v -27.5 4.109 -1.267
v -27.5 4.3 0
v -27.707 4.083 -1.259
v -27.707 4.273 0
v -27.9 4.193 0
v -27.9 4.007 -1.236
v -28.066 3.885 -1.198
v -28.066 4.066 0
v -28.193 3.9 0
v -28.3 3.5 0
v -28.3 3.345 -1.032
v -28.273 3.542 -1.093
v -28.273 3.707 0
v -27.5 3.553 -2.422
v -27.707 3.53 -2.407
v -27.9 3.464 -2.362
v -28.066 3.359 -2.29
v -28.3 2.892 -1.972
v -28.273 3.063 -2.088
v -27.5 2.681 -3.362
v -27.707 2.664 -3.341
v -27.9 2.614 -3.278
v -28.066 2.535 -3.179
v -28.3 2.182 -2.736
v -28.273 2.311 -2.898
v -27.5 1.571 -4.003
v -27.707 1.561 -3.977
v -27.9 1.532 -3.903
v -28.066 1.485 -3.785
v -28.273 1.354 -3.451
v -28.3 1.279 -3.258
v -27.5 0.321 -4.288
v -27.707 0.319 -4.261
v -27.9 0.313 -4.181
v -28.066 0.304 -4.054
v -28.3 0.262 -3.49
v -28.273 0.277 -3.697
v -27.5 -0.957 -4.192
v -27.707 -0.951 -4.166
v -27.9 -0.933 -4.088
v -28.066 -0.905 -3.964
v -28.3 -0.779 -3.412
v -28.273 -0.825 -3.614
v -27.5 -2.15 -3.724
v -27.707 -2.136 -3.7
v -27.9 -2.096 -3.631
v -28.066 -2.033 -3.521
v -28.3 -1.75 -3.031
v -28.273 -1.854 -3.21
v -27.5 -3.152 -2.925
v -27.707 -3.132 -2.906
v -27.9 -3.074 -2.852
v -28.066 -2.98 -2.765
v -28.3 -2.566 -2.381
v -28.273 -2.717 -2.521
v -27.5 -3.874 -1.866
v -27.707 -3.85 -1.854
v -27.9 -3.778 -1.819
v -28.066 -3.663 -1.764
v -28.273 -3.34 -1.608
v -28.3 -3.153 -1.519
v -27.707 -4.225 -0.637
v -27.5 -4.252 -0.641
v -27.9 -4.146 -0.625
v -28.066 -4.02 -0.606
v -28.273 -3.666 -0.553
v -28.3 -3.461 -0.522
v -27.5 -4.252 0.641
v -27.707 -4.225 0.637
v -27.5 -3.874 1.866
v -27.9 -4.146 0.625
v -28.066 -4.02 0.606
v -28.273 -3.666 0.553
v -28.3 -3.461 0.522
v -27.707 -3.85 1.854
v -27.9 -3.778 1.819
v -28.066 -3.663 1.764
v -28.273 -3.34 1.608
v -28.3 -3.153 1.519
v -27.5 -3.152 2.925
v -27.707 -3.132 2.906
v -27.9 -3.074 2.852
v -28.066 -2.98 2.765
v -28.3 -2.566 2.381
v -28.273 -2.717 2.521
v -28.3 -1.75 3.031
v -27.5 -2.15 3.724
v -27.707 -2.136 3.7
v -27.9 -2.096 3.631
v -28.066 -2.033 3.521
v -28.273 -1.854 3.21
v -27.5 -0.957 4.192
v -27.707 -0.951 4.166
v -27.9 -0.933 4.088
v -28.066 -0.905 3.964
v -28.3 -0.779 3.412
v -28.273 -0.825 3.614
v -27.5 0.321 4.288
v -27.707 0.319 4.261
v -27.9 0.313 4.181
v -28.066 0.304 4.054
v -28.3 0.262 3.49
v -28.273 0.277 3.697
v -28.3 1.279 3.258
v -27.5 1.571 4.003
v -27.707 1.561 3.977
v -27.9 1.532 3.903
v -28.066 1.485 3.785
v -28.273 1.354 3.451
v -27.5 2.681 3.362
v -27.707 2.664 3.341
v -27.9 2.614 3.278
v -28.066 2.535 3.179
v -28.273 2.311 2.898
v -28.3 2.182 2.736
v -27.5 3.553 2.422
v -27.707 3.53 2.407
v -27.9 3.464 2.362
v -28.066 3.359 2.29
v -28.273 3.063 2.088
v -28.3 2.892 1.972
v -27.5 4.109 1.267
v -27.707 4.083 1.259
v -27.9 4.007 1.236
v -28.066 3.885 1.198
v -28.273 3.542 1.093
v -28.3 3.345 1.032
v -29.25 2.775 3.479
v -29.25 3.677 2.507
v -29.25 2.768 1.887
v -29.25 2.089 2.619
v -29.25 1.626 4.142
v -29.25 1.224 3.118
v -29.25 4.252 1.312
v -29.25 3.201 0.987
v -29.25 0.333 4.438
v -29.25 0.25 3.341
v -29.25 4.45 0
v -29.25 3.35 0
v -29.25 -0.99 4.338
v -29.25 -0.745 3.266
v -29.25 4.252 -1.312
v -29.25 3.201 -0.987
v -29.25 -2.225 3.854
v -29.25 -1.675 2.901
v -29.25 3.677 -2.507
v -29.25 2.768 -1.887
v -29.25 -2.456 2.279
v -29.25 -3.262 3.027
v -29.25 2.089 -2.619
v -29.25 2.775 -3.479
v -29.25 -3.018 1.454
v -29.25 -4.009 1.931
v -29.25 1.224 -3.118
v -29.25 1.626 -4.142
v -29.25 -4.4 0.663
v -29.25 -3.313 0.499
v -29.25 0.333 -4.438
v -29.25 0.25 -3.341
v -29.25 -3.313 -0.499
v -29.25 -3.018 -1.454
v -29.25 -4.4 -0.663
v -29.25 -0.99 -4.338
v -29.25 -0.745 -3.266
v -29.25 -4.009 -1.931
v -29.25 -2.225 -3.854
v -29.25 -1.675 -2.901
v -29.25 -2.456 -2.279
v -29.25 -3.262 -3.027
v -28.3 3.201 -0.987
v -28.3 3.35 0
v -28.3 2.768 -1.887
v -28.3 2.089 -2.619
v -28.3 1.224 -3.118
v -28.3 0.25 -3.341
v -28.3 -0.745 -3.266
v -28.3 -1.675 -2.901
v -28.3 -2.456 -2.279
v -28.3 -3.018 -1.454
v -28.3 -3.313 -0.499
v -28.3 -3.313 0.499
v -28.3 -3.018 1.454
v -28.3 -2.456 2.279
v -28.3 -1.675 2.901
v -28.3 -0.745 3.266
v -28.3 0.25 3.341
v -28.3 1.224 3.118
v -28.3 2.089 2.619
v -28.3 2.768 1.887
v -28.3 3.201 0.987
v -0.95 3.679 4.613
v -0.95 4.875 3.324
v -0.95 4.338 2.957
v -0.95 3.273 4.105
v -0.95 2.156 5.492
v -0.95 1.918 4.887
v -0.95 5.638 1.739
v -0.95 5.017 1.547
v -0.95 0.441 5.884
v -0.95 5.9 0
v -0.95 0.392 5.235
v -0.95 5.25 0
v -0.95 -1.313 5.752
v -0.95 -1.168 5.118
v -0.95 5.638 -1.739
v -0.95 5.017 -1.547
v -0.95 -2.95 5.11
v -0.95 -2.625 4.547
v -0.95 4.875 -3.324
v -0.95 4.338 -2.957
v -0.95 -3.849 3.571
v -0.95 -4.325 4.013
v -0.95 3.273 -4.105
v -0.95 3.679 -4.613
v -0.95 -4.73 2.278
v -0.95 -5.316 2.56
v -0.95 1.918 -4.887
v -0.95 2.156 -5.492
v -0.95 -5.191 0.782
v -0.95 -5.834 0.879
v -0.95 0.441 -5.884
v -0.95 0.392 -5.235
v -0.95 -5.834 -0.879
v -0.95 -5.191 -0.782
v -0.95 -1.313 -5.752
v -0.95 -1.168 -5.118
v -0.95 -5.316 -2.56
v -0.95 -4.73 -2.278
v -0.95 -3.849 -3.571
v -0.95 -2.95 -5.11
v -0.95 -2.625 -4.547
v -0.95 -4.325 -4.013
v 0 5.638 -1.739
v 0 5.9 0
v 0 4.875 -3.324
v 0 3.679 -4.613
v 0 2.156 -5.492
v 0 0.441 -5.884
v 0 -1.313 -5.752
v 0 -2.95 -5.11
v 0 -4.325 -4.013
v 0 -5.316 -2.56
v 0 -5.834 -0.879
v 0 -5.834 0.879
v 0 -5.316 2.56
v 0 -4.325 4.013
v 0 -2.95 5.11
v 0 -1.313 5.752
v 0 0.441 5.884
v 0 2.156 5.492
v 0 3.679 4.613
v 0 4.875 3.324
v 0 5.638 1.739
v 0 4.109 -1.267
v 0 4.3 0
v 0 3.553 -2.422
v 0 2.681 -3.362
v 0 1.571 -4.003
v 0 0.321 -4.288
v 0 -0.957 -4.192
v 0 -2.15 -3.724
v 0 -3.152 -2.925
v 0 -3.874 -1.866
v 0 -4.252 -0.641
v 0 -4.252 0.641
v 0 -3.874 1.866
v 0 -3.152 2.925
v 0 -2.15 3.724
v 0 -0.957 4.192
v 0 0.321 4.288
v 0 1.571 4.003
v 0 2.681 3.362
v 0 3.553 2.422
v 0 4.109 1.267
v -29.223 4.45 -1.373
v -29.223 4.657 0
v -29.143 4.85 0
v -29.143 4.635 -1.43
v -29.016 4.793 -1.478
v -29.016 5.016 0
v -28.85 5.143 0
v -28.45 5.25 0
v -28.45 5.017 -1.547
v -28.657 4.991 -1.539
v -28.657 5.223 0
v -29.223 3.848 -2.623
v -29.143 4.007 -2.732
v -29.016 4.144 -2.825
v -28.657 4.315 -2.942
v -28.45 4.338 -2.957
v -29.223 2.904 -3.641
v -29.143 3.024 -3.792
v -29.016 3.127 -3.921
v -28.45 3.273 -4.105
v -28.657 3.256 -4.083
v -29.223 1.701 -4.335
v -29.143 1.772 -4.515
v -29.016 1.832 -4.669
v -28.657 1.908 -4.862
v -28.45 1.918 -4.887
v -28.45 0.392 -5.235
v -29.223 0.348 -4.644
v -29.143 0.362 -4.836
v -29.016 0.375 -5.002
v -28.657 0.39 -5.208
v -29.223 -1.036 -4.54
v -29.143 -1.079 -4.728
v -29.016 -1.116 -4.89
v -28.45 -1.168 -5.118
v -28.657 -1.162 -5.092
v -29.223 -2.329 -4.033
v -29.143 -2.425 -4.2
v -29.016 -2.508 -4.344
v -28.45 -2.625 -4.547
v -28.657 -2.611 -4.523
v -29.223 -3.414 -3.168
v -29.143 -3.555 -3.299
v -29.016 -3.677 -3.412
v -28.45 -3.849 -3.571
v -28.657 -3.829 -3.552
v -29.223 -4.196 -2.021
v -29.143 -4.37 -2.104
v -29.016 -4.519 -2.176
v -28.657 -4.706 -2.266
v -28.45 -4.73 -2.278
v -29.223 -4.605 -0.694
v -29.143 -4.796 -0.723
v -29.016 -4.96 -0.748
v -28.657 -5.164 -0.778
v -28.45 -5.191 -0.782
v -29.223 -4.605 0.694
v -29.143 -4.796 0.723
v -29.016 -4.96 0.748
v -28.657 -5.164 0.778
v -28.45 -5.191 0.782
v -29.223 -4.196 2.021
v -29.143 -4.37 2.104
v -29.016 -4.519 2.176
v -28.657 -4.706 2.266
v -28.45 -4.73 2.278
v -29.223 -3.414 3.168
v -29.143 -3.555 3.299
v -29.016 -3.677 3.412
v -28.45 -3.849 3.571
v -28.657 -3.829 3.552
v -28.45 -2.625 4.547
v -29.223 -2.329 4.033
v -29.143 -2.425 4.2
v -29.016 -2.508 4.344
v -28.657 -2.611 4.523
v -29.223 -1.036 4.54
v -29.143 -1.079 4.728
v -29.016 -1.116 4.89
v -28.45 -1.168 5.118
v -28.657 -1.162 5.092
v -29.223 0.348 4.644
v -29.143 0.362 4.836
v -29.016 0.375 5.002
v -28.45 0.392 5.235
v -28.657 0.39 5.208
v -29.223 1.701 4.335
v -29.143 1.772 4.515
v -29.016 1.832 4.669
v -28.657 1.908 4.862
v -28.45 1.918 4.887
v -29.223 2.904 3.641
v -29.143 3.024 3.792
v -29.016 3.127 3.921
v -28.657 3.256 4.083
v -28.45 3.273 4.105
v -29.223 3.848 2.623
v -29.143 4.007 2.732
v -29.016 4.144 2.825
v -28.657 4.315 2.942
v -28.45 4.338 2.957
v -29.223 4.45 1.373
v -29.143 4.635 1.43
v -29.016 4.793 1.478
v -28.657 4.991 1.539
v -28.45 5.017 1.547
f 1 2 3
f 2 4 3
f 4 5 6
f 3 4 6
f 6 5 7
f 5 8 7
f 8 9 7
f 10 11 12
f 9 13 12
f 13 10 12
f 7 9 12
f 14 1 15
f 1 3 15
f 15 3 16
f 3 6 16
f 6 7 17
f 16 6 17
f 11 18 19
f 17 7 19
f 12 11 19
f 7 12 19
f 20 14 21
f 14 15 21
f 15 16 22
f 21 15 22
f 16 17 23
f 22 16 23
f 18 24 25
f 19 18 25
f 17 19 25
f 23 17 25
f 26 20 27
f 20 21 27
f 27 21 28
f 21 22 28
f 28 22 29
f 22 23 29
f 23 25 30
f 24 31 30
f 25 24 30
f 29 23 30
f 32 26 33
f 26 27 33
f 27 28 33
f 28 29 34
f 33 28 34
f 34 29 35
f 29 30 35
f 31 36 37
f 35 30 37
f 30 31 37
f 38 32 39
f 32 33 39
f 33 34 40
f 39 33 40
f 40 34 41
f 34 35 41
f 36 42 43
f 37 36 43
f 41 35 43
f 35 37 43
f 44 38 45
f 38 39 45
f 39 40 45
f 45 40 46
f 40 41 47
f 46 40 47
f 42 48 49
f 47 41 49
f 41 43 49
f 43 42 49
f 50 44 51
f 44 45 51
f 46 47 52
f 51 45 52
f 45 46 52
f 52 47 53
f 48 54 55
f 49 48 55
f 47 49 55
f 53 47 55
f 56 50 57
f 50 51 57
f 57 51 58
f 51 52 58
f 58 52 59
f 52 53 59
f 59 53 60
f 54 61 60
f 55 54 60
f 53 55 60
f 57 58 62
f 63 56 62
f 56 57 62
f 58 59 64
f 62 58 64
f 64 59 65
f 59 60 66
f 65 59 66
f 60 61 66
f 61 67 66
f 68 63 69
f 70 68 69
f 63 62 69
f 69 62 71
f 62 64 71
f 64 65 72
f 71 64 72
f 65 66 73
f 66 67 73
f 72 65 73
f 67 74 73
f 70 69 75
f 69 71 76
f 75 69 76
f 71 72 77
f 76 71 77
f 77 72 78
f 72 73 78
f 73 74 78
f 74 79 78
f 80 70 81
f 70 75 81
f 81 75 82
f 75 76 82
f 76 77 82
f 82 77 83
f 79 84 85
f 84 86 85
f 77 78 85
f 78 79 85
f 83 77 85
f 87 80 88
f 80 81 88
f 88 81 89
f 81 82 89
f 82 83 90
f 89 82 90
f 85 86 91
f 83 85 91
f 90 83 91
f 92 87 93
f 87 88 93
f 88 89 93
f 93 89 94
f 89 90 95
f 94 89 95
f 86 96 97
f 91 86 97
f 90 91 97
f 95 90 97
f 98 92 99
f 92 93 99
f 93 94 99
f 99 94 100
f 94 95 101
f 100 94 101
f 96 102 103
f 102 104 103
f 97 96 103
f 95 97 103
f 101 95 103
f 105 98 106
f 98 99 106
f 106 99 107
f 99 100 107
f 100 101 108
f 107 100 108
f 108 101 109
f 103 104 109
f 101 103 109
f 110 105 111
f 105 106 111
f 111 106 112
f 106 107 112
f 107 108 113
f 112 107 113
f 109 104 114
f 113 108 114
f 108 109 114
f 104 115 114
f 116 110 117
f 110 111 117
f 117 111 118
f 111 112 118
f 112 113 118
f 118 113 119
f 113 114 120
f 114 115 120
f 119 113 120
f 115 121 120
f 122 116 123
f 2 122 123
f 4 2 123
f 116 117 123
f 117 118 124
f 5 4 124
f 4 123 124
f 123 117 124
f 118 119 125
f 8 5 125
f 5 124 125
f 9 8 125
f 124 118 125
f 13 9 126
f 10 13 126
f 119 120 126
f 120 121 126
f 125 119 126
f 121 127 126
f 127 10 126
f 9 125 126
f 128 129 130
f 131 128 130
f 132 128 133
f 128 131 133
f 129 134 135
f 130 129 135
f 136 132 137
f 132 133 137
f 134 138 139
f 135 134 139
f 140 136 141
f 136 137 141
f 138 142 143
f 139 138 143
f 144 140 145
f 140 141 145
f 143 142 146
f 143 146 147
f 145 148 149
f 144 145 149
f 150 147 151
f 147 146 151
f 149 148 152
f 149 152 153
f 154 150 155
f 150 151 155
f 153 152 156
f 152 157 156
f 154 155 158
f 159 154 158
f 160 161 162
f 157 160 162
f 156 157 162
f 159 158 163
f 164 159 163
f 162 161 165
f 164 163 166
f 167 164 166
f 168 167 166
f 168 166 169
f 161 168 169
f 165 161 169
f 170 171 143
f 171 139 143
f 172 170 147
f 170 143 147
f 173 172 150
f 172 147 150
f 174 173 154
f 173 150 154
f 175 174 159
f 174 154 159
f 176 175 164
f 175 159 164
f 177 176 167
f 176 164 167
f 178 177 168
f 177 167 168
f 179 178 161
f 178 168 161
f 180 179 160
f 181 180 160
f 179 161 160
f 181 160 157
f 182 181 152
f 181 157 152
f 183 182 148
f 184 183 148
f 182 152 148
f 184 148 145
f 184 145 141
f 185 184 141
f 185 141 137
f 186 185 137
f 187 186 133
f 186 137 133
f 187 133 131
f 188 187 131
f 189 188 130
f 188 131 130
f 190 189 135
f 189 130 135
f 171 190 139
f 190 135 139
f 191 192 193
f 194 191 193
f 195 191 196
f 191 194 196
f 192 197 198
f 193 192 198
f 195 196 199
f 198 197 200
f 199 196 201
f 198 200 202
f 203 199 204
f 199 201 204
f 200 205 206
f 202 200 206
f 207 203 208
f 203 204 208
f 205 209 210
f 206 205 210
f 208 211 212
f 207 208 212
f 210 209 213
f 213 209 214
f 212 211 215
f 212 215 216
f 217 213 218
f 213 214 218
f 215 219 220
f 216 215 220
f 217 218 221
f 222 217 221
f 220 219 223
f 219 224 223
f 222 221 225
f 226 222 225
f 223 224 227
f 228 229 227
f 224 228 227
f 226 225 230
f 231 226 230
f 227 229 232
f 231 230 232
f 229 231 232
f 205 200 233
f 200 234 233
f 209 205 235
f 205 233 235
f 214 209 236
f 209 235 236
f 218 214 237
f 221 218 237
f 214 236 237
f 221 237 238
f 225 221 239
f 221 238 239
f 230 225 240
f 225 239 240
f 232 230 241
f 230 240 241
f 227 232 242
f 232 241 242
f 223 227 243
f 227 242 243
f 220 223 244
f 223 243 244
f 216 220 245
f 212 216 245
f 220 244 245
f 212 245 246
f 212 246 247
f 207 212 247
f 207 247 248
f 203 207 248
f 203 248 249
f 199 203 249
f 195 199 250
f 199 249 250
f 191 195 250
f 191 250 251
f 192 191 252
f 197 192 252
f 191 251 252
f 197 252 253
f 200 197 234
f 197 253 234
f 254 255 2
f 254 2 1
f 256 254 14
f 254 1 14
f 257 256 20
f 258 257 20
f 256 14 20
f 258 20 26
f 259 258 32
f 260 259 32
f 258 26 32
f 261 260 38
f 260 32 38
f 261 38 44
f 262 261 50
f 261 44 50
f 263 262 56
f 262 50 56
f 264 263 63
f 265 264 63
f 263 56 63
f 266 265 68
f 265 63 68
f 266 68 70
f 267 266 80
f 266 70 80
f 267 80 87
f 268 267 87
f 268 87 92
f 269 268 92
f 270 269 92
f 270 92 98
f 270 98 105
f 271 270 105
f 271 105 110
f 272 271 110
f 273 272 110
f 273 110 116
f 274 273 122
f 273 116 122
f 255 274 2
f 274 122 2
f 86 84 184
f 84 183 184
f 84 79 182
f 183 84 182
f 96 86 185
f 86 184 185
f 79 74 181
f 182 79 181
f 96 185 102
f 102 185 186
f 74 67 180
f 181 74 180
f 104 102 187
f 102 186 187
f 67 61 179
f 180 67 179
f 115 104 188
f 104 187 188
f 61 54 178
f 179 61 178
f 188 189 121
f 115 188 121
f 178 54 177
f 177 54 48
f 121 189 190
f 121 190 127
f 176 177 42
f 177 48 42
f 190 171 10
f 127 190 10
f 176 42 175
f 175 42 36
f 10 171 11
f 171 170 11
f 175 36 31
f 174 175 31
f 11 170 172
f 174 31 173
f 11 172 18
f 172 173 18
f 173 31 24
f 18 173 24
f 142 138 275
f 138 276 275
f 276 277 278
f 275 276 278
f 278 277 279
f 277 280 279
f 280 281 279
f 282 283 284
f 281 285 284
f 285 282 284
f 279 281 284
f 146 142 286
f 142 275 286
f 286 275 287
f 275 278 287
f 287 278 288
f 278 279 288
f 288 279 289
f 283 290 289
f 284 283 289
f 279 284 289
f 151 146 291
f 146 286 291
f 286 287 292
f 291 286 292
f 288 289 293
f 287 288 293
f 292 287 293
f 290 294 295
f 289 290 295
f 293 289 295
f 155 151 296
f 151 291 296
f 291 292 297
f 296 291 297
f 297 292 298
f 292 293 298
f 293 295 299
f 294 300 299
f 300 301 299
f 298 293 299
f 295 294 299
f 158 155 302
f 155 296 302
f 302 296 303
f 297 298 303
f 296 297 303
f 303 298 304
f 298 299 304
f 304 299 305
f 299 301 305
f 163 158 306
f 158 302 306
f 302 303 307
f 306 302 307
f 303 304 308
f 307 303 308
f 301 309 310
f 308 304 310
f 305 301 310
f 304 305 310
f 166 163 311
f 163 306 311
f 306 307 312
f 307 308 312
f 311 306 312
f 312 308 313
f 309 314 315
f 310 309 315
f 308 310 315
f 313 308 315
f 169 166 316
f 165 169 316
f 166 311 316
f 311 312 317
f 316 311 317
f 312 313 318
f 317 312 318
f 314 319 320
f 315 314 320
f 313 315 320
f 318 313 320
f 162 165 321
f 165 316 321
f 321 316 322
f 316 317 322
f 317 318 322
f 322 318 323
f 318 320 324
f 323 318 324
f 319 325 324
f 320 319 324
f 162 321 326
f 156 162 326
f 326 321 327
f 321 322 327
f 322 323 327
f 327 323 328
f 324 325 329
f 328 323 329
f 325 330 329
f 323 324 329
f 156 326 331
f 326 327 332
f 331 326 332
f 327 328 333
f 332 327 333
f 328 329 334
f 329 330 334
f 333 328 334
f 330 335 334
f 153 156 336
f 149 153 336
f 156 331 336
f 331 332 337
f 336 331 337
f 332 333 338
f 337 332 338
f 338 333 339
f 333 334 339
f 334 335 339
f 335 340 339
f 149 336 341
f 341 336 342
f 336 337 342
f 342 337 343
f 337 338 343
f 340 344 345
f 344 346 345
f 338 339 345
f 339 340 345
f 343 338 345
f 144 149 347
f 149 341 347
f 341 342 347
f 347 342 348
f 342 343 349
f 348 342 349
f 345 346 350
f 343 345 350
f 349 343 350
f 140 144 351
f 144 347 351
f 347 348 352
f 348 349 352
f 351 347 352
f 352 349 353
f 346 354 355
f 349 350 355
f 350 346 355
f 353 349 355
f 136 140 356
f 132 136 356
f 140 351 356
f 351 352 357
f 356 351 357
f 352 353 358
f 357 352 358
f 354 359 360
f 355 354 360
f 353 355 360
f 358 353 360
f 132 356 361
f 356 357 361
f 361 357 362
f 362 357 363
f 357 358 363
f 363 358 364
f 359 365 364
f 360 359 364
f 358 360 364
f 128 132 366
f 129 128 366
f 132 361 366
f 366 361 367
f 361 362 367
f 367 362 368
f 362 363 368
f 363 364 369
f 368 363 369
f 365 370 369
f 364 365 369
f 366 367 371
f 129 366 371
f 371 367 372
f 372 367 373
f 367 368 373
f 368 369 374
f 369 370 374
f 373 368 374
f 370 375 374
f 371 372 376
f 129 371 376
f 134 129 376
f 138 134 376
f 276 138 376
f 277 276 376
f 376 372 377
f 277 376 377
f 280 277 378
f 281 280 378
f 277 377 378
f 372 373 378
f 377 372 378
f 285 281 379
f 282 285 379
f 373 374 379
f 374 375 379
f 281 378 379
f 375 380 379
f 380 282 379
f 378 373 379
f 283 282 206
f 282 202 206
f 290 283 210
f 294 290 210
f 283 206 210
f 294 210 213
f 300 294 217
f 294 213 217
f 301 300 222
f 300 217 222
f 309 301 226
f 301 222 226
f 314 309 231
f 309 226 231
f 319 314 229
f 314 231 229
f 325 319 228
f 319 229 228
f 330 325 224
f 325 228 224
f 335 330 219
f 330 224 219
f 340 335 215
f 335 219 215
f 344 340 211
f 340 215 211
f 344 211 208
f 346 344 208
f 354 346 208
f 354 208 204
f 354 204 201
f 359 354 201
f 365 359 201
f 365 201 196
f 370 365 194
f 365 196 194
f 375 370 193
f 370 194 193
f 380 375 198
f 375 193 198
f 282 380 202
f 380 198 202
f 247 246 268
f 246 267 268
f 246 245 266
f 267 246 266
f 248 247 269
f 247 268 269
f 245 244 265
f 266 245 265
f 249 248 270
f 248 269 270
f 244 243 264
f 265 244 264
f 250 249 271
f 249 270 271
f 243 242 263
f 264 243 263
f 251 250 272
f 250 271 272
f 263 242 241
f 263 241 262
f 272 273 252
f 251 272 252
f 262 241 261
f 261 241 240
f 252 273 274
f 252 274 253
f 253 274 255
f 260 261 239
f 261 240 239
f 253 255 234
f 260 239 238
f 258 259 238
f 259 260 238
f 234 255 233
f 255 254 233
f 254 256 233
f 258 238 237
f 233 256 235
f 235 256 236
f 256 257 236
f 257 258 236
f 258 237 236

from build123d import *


with BuildPart() as part:
    # Esquisse1 → Révolution1 (revolve)
    with BuildSketch(Plane.XY):
        with BuildLine():
            Line((0, 4.3), (-27.5, 4.3))
            ThreePointArc((-27.5, 4.3), (-28.065685425, 4.065685425), (-28.3, 3.5))
            Line((-28.3, 3.5), (-28.3, 3.35))
            Line((-28.3, 3.35), (-29.25, 3.35))
            Line((-29.25, 3.35), (-29.25, 4.45))
            ThreePointArc((-29.25, 4.45), (-29.015685425, 5.015685425), (-28.45, 5.25))
            Line((-28.45, 5.25), (-0.95, 5.25))
            Line((-0.95, 5.25), (-0.95, 5.9))
            Line((-0.95, 5.9), (0, 5.9))
            Line((0, 5.9), (0, 5.25))
            Line((0, 5.25), (0, 4.3))
        make_face()
    revolve(axis=Axis((0, 0, 0), (-1, 0, 0)))


solid = part.part
